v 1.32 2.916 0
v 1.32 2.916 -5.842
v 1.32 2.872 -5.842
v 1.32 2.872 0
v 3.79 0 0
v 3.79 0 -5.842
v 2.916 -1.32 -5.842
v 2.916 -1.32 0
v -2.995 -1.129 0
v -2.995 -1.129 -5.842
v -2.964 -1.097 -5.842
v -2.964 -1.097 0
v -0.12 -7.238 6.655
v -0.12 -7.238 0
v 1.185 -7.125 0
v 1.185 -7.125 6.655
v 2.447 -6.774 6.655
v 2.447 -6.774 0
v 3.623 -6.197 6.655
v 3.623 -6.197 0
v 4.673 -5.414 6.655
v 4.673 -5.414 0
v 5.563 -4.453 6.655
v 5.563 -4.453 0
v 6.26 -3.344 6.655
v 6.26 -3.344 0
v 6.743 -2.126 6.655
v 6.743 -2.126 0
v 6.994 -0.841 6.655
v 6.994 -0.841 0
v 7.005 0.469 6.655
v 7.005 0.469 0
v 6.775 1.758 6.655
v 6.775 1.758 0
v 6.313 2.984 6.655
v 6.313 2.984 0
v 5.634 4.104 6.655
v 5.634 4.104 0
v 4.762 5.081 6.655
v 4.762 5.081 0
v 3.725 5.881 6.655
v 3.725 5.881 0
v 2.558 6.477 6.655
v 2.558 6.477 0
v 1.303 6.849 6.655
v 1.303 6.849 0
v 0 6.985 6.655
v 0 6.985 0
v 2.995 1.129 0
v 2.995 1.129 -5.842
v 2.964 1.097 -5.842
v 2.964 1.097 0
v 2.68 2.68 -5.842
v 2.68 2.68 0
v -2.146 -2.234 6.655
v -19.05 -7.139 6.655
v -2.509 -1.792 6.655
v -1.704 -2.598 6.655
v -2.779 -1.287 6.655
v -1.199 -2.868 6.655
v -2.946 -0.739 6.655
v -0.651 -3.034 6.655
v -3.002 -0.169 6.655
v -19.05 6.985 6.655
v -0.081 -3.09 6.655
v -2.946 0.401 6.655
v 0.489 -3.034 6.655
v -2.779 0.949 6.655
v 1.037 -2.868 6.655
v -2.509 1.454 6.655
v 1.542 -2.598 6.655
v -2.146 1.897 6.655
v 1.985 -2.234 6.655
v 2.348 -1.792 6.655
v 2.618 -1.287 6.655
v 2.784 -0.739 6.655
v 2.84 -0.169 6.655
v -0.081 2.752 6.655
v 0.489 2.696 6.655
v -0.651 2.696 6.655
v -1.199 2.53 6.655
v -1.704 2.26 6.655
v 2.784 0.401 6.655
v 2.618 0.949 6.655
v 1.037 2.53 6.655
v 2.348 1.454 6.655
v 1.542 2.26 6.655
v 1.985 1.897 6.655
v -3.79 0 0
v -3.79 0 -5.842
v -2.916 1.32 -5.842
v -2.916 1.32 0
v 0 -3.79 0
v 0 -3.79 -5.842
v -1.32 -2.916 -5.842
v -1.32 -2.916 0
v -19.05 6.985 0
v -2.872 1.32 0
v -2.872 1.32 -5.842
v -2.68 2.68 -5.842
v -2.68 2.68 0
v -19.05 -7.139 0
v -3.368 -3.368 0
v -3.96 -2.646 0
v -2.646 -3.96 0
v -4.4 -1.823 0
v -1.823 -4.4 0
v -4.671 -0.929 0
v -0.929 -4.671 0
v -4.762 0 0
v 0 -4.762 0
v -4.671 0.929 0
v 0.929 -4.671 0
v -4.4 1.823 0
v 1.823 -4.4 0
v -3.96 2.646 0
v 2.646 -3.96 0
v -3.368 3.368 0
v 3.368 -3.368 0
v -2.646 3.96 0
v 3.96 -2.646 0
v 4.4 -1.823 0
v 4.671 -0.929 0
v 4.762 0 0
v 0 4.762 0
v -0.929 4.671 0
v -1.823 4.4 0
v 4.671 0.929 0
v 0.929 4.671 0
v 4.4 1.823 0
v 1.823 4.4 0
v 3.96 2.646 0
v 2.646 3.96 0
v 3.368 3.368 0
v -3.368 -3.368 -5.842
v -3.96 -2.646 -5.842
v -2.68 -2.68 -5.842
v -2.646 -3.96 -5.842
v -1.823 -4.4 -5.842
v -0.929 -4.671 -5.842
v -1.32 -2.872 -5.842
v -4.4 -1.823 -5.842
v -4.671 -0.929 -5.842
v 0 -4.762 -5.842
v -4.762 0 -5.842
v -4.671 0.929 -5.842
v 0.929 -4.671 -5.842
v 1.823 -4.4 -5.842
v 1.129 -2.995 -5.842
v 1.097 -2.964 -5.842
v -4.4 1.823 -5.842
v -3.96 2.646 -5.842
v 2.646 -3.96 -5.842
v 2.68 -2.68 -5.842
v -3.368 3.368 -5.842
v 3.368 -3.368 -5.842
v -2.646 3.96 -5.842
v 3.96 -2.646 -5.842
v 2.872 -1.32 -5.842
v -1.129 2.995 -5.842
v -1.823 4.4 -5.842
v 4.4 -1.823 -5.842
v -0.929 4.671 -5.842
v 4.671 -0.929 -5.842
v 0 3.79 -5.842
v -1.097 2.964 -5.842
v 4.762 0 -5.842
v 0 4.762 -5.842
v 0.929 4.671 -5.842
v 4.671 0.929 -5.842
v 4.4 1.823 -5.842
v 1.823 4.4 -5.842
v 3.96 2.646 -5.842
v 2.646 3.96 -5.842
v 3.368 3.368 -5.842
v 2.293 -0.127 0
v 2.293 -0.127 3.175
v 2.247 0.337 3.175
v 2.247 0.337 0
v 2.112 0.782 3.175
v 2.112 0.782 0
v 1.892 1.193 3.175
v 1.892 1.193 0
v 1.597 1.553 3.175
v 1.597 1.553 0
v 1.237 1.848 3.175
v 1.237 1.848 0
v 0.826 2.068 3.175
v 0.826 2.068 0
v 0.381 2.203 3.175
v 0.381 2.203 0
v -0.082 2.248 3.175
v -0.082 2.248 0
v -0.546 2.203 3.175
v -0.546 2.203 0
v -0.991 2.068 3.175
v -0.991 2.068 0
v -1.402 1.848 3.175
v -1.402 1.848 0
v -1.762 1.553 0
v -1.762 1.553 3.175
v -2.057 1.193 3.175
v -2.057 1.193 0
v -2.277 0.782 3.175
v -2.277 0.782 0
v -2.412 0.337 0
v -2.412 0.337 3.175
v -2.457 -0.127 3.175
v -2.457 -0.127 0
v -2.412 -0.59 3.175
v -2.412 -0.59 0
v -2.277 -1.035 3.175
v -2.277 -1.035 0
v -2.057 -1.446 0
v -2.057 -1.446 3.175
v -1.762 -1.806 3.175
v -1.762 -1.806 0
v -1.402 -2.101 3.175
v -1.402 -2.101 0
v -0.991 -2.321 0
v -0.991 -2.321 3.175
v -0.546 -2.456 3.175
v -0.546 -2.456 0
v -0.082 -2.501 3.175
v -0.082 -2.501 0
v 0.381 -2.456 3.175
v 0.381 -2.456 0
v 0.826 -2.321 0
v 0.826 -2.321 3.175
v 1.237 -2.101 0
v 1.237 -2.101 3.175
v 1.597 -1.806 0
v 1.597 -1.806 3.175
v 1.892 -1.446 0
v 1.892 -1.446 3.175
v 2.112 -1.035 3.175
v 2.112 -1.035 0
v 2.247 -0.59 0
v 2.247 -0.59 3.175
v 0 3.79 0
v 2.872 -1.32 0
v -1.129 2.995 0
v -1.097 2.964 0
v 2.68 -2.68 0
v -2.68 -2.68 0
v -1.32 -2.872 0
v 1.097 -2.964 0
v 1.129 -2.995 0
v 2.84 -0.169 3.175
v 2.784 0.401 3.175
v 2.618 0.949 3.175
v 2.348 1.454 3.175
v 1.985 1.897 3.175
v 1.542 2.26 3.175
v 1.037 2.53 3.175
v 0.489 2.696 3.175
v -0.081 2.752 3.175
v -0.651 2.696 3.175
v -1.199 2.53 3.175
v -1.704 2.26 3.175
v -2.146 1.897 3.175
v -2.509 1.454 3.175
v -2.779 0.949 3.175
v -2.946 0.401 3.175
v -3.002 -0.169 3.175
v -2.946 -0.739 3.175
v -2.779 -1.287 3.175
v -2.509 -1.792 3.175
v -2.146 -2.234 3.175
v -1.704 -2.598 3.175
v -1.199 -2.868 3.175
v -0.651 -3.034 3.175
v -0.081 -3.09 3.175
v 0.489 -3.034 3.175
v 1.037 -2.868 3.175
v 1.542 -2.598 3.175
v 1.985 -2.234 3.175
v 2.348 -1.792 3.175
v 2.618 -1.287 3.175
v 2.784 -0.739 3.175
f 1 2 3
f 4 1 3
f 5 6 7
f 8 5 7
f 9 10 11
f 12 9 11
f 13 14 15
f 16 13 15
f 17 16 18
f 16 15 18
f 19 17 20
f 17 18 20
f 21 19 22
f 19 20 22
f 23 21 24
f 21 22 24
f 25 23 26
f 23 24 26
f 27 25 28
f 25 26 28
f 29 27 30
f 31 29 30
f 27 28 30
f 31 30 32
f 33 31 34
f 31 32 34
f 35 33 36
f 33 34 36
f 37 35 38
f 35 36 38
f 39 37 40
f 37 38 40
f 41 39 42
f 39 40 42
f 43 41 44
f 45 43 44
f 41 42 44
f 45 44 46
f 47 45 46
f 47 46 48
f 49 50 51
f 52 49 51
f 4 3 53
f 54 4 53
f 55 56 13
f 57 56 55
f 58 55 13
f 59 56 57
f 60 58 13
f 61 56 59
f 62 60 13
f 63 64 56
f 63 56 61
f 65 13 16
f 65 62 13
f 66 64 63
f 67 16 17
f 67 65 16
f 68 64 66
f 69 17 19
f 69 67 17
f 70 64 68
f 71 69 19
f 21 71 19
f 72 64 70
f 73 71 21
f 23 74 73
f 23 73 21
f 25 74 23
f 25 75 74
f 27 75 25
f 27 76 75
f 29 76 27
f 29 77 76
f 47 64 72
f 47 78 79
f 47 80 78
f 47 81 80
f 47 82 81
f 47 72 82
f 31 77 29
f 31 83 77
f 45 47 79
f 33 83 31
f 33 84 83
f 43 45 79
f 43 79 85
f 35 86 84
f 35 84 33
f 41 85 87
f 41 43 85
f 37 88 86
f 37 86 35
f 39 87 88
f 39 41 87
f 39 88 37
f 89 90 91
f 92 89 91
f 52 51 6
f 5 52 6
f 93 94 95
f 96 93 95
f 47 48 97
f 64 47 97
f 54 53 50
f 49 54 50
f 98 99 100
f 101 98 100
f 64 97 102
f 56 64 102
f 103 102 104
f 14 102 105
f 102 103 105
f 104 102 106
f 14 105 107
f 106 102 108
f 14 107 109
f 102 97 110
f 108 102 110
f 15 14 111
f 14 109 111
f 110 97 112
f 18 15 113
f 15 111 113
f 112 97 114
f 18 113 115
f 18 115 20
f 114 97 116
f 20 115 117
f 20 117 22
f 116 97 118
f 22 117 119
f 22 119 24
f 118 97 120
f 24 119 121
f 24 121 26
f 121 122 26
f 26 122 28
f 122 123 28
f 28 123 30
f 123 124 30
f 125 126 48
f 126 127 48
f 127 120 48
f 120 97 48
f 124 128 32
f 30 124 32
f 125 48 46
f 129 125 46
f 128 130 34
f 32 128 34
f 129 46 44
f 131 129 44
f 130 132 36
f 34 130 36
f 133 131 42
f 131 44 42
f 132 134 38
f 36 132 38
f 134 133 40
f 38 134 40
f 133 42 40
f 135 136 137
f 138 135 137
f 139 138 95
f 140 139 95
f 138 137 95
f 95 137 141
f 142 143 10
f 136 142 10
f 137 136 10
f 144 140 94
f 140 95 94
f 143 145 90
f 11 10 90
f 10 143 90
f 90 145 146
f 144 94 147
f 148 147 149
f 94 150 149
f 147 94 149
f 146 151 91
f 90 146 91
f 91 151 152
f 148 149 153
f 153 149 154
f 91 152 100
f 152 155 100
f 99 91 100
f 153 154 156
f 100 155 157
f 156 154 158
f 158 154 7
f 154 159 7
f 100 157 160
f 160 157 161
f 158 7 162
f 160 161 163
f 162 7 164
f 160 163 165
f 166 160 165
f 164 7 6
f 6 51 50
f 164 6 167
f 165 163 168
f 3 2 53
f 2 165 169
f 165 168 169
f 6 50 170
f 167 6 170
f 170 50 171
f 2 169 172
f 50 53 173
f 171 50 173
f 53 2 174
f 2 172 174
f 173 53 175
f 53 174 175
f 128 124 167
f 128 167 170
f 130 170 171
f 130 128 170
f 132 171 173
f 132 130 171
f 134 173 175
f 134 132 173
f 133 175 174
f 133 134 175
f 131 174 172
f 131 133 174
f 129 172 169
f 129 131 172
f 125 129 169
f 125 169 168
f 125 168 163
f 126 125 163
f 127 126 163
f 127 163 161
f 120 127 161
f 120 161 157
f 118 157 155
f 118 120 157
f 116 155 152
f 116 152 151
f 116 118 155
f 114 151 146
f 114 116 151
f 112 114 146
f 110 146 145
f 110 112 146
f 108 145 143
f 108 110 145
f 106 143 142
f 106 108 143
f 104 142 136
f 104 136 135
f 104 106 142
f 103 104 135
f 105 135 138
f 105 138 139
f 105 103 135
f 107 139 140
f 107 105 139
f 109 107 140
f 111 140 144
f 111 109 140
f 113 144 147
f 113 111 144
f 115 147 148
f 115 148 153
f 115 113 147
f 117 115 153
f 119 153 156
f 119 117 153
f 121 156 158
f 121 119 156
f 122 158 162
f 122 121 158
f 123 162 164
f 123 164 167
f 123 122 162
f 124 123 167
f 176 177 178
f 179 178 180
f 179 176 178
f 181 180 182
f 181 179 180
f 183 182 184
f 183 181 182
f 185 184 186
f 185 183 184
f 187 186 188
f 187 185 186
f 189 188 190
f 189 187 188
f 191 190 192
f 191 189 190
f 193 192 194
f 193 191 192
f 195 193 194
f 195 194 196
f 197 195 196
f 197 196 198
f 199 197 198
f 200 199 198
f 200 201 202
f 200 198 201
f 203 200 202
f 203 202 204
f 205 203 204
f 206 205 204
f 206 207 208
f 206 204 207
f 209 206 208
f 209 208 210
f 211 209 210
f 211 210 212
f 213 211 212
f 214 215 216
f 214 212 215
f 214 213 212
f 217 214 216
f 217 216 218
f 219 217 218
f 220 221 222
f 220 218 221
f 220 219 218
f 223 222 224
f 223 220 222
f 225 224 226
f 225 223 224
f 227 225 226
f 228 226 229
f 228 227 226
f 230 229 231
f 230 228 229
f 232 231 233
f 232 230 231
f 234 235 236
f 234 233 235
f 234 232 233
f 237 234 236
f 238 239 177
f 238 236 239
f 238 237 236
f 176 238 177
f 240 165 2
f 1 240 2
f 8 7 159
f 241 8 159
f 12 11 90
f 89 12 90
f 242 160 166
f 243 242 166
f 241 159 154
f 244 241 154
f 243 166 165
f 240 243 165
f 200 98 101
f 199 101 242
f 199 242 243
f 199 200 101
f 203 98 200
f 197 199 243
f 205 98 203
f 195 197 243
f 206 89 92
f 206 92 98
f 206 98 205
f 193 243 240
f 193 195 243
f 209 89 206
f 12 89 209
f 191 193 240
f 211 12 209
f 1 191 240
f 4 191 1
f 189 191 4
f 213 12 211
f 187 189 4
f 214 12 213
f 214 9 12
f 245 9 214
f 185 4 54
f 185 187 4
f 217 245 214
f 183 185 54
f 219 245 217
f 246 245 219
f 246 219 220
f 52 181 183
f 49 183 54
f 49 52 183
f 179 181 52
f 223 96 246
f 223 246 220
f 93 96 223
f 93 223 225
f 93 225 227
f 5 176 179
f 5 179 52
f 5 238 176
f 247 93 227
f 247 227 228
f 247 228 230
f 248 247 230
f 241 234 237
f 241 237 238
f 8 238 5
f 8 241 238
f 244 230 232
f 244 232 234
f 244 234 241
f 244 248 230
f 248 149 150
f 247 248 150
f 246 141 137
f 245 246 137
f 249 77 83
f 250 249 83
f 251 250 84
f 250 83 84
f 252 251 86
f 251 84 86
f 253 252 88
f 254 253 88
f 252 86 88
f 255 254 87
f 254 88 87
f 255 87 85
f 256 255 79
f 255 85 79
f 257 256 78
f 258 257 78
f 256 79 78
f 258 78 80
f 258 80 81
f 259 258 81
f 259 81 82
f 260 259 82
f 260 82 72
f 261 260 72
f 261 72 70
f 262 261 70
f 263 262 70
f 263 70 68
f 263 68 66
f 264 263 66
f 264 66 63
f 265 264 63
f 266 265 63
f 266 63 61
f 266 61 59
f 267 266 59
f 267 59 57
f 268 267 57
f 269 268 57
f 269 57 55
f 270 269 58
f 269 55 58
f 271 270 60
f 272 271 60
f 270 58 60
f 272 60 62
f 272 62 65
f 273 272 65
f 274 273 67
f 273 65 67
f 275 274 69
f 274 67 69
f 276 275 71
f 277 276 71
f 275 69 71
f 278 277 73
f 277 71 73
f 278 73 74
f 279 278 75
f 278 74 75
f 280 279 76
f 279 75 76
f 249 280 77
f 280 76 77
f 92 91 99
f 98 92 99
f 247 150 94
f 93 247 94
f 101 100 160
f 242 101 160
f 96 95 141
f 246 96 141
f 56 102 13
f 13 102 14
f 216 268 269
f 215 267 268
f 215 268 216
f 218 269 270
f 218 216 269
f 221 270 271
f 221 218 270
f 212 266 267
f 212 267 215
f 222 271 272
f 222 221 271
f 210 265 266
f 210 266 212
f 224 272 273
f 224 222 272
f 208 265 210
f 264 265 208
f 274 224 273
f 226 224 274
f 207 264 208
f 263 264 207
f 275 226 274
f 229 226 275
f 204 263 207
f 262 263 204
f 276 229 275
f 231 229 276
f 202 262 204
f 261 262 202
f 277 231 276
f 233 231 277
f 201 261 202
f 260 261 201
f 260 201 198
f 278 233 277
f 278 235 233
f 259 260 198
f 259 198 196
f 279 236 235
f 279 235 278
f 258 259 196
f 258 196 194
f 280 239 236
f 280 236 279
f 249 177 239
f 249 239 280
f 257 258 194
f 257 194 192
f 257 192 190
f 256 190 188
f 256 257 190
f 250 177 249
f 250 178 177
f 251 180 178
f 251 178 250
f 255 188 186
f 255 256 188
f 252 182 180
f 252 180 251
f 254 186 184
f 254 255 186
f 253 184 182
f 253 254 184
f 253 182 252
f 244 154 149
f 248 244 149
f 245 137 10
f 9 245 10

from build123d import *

# Parameters (mm, degrees)
F0_R            = 2.3749
F1_DEPTH        = 6.6548
F2_R            = 4.7625
F3_DEPTH        = 5.842
F5_DEPTH        = 5.842
F5_COPIES_COUNT = 8
F7_R            = 2.921
F8_DEPTH        = 22.225


# Not quite as in the source:
# - a pattern or mirror of a feature is missing from the dataset's text; its kind, count and spacing are read off the source's solid


with BuildPart() as f1:
    # F0 (on Top) → F1 (new body)
    with BuildSketch(Plane.XY):
        with BuildLine():
            ThreePointArc((-0.1195971757, -7.2384254858), (7.0293678249, -0.1863217508), (0, 6.985))
            Line((0, 6.985), (-19.05, 6.985))
            Line((-19.05, 6.985), (-19.05, 0))
            Line((-19.05, 0), (-19.05, -7.1393631719))
            Line((-19.05, -7.1393631719), (-0.1195971757, -7.2384254858))
        make_face()
        with Locations((-0.0823807711, -0.1265228614)):
            Circle(F0_R, mode=Mode.SUBTRACT)
    extrude(amount=F1_DEPTH)

    # F2 (on Top) → F3 (join)
    with BuildSketch(Plane.XY):
        Circle(F2_R)
    extrude(amount=-F3_DEPTH)

    # F4 (on face) → F5 (cut)
    with BuildSketch(Plane(origin=(0, 0, -5.842), x_dir=(1, 0, 0), z_dir=(0, 0, -1))):
        Polygon((0, 1.3200769899), (0, 0), (0, -1.2728312286), (2.831584774, -1.2728312286), (3.7898337469, 0), (2.916136058, 1.3200769899), align=None)
    f5 = extrude(amount=-F5_DEPTH, mode=Mode.SUBTRACT)

    # F5_copies: F5 ×8 about axis
    f5_copies_axis = Axis((0, 0, 0), (0, 0, 1))
    for i in range(1, F5_COPIES_COUNT):
        add(f5.rotate(f5_copies_axis, i * 360 / F5_COPIES_COUNT), mode=Mode.SUBTRACT)

    # F7 (on offset) → F8 (cut)
    with BuildSketch(Plane.XY.offset(25.4)):
        with Locations((-0.0807045596, -0.1689054021)):
            Circle(F7_R)
    extrude(amount=-F8_DEPTH, mode=Mode.SUBTRACT)


solid = f1.part
